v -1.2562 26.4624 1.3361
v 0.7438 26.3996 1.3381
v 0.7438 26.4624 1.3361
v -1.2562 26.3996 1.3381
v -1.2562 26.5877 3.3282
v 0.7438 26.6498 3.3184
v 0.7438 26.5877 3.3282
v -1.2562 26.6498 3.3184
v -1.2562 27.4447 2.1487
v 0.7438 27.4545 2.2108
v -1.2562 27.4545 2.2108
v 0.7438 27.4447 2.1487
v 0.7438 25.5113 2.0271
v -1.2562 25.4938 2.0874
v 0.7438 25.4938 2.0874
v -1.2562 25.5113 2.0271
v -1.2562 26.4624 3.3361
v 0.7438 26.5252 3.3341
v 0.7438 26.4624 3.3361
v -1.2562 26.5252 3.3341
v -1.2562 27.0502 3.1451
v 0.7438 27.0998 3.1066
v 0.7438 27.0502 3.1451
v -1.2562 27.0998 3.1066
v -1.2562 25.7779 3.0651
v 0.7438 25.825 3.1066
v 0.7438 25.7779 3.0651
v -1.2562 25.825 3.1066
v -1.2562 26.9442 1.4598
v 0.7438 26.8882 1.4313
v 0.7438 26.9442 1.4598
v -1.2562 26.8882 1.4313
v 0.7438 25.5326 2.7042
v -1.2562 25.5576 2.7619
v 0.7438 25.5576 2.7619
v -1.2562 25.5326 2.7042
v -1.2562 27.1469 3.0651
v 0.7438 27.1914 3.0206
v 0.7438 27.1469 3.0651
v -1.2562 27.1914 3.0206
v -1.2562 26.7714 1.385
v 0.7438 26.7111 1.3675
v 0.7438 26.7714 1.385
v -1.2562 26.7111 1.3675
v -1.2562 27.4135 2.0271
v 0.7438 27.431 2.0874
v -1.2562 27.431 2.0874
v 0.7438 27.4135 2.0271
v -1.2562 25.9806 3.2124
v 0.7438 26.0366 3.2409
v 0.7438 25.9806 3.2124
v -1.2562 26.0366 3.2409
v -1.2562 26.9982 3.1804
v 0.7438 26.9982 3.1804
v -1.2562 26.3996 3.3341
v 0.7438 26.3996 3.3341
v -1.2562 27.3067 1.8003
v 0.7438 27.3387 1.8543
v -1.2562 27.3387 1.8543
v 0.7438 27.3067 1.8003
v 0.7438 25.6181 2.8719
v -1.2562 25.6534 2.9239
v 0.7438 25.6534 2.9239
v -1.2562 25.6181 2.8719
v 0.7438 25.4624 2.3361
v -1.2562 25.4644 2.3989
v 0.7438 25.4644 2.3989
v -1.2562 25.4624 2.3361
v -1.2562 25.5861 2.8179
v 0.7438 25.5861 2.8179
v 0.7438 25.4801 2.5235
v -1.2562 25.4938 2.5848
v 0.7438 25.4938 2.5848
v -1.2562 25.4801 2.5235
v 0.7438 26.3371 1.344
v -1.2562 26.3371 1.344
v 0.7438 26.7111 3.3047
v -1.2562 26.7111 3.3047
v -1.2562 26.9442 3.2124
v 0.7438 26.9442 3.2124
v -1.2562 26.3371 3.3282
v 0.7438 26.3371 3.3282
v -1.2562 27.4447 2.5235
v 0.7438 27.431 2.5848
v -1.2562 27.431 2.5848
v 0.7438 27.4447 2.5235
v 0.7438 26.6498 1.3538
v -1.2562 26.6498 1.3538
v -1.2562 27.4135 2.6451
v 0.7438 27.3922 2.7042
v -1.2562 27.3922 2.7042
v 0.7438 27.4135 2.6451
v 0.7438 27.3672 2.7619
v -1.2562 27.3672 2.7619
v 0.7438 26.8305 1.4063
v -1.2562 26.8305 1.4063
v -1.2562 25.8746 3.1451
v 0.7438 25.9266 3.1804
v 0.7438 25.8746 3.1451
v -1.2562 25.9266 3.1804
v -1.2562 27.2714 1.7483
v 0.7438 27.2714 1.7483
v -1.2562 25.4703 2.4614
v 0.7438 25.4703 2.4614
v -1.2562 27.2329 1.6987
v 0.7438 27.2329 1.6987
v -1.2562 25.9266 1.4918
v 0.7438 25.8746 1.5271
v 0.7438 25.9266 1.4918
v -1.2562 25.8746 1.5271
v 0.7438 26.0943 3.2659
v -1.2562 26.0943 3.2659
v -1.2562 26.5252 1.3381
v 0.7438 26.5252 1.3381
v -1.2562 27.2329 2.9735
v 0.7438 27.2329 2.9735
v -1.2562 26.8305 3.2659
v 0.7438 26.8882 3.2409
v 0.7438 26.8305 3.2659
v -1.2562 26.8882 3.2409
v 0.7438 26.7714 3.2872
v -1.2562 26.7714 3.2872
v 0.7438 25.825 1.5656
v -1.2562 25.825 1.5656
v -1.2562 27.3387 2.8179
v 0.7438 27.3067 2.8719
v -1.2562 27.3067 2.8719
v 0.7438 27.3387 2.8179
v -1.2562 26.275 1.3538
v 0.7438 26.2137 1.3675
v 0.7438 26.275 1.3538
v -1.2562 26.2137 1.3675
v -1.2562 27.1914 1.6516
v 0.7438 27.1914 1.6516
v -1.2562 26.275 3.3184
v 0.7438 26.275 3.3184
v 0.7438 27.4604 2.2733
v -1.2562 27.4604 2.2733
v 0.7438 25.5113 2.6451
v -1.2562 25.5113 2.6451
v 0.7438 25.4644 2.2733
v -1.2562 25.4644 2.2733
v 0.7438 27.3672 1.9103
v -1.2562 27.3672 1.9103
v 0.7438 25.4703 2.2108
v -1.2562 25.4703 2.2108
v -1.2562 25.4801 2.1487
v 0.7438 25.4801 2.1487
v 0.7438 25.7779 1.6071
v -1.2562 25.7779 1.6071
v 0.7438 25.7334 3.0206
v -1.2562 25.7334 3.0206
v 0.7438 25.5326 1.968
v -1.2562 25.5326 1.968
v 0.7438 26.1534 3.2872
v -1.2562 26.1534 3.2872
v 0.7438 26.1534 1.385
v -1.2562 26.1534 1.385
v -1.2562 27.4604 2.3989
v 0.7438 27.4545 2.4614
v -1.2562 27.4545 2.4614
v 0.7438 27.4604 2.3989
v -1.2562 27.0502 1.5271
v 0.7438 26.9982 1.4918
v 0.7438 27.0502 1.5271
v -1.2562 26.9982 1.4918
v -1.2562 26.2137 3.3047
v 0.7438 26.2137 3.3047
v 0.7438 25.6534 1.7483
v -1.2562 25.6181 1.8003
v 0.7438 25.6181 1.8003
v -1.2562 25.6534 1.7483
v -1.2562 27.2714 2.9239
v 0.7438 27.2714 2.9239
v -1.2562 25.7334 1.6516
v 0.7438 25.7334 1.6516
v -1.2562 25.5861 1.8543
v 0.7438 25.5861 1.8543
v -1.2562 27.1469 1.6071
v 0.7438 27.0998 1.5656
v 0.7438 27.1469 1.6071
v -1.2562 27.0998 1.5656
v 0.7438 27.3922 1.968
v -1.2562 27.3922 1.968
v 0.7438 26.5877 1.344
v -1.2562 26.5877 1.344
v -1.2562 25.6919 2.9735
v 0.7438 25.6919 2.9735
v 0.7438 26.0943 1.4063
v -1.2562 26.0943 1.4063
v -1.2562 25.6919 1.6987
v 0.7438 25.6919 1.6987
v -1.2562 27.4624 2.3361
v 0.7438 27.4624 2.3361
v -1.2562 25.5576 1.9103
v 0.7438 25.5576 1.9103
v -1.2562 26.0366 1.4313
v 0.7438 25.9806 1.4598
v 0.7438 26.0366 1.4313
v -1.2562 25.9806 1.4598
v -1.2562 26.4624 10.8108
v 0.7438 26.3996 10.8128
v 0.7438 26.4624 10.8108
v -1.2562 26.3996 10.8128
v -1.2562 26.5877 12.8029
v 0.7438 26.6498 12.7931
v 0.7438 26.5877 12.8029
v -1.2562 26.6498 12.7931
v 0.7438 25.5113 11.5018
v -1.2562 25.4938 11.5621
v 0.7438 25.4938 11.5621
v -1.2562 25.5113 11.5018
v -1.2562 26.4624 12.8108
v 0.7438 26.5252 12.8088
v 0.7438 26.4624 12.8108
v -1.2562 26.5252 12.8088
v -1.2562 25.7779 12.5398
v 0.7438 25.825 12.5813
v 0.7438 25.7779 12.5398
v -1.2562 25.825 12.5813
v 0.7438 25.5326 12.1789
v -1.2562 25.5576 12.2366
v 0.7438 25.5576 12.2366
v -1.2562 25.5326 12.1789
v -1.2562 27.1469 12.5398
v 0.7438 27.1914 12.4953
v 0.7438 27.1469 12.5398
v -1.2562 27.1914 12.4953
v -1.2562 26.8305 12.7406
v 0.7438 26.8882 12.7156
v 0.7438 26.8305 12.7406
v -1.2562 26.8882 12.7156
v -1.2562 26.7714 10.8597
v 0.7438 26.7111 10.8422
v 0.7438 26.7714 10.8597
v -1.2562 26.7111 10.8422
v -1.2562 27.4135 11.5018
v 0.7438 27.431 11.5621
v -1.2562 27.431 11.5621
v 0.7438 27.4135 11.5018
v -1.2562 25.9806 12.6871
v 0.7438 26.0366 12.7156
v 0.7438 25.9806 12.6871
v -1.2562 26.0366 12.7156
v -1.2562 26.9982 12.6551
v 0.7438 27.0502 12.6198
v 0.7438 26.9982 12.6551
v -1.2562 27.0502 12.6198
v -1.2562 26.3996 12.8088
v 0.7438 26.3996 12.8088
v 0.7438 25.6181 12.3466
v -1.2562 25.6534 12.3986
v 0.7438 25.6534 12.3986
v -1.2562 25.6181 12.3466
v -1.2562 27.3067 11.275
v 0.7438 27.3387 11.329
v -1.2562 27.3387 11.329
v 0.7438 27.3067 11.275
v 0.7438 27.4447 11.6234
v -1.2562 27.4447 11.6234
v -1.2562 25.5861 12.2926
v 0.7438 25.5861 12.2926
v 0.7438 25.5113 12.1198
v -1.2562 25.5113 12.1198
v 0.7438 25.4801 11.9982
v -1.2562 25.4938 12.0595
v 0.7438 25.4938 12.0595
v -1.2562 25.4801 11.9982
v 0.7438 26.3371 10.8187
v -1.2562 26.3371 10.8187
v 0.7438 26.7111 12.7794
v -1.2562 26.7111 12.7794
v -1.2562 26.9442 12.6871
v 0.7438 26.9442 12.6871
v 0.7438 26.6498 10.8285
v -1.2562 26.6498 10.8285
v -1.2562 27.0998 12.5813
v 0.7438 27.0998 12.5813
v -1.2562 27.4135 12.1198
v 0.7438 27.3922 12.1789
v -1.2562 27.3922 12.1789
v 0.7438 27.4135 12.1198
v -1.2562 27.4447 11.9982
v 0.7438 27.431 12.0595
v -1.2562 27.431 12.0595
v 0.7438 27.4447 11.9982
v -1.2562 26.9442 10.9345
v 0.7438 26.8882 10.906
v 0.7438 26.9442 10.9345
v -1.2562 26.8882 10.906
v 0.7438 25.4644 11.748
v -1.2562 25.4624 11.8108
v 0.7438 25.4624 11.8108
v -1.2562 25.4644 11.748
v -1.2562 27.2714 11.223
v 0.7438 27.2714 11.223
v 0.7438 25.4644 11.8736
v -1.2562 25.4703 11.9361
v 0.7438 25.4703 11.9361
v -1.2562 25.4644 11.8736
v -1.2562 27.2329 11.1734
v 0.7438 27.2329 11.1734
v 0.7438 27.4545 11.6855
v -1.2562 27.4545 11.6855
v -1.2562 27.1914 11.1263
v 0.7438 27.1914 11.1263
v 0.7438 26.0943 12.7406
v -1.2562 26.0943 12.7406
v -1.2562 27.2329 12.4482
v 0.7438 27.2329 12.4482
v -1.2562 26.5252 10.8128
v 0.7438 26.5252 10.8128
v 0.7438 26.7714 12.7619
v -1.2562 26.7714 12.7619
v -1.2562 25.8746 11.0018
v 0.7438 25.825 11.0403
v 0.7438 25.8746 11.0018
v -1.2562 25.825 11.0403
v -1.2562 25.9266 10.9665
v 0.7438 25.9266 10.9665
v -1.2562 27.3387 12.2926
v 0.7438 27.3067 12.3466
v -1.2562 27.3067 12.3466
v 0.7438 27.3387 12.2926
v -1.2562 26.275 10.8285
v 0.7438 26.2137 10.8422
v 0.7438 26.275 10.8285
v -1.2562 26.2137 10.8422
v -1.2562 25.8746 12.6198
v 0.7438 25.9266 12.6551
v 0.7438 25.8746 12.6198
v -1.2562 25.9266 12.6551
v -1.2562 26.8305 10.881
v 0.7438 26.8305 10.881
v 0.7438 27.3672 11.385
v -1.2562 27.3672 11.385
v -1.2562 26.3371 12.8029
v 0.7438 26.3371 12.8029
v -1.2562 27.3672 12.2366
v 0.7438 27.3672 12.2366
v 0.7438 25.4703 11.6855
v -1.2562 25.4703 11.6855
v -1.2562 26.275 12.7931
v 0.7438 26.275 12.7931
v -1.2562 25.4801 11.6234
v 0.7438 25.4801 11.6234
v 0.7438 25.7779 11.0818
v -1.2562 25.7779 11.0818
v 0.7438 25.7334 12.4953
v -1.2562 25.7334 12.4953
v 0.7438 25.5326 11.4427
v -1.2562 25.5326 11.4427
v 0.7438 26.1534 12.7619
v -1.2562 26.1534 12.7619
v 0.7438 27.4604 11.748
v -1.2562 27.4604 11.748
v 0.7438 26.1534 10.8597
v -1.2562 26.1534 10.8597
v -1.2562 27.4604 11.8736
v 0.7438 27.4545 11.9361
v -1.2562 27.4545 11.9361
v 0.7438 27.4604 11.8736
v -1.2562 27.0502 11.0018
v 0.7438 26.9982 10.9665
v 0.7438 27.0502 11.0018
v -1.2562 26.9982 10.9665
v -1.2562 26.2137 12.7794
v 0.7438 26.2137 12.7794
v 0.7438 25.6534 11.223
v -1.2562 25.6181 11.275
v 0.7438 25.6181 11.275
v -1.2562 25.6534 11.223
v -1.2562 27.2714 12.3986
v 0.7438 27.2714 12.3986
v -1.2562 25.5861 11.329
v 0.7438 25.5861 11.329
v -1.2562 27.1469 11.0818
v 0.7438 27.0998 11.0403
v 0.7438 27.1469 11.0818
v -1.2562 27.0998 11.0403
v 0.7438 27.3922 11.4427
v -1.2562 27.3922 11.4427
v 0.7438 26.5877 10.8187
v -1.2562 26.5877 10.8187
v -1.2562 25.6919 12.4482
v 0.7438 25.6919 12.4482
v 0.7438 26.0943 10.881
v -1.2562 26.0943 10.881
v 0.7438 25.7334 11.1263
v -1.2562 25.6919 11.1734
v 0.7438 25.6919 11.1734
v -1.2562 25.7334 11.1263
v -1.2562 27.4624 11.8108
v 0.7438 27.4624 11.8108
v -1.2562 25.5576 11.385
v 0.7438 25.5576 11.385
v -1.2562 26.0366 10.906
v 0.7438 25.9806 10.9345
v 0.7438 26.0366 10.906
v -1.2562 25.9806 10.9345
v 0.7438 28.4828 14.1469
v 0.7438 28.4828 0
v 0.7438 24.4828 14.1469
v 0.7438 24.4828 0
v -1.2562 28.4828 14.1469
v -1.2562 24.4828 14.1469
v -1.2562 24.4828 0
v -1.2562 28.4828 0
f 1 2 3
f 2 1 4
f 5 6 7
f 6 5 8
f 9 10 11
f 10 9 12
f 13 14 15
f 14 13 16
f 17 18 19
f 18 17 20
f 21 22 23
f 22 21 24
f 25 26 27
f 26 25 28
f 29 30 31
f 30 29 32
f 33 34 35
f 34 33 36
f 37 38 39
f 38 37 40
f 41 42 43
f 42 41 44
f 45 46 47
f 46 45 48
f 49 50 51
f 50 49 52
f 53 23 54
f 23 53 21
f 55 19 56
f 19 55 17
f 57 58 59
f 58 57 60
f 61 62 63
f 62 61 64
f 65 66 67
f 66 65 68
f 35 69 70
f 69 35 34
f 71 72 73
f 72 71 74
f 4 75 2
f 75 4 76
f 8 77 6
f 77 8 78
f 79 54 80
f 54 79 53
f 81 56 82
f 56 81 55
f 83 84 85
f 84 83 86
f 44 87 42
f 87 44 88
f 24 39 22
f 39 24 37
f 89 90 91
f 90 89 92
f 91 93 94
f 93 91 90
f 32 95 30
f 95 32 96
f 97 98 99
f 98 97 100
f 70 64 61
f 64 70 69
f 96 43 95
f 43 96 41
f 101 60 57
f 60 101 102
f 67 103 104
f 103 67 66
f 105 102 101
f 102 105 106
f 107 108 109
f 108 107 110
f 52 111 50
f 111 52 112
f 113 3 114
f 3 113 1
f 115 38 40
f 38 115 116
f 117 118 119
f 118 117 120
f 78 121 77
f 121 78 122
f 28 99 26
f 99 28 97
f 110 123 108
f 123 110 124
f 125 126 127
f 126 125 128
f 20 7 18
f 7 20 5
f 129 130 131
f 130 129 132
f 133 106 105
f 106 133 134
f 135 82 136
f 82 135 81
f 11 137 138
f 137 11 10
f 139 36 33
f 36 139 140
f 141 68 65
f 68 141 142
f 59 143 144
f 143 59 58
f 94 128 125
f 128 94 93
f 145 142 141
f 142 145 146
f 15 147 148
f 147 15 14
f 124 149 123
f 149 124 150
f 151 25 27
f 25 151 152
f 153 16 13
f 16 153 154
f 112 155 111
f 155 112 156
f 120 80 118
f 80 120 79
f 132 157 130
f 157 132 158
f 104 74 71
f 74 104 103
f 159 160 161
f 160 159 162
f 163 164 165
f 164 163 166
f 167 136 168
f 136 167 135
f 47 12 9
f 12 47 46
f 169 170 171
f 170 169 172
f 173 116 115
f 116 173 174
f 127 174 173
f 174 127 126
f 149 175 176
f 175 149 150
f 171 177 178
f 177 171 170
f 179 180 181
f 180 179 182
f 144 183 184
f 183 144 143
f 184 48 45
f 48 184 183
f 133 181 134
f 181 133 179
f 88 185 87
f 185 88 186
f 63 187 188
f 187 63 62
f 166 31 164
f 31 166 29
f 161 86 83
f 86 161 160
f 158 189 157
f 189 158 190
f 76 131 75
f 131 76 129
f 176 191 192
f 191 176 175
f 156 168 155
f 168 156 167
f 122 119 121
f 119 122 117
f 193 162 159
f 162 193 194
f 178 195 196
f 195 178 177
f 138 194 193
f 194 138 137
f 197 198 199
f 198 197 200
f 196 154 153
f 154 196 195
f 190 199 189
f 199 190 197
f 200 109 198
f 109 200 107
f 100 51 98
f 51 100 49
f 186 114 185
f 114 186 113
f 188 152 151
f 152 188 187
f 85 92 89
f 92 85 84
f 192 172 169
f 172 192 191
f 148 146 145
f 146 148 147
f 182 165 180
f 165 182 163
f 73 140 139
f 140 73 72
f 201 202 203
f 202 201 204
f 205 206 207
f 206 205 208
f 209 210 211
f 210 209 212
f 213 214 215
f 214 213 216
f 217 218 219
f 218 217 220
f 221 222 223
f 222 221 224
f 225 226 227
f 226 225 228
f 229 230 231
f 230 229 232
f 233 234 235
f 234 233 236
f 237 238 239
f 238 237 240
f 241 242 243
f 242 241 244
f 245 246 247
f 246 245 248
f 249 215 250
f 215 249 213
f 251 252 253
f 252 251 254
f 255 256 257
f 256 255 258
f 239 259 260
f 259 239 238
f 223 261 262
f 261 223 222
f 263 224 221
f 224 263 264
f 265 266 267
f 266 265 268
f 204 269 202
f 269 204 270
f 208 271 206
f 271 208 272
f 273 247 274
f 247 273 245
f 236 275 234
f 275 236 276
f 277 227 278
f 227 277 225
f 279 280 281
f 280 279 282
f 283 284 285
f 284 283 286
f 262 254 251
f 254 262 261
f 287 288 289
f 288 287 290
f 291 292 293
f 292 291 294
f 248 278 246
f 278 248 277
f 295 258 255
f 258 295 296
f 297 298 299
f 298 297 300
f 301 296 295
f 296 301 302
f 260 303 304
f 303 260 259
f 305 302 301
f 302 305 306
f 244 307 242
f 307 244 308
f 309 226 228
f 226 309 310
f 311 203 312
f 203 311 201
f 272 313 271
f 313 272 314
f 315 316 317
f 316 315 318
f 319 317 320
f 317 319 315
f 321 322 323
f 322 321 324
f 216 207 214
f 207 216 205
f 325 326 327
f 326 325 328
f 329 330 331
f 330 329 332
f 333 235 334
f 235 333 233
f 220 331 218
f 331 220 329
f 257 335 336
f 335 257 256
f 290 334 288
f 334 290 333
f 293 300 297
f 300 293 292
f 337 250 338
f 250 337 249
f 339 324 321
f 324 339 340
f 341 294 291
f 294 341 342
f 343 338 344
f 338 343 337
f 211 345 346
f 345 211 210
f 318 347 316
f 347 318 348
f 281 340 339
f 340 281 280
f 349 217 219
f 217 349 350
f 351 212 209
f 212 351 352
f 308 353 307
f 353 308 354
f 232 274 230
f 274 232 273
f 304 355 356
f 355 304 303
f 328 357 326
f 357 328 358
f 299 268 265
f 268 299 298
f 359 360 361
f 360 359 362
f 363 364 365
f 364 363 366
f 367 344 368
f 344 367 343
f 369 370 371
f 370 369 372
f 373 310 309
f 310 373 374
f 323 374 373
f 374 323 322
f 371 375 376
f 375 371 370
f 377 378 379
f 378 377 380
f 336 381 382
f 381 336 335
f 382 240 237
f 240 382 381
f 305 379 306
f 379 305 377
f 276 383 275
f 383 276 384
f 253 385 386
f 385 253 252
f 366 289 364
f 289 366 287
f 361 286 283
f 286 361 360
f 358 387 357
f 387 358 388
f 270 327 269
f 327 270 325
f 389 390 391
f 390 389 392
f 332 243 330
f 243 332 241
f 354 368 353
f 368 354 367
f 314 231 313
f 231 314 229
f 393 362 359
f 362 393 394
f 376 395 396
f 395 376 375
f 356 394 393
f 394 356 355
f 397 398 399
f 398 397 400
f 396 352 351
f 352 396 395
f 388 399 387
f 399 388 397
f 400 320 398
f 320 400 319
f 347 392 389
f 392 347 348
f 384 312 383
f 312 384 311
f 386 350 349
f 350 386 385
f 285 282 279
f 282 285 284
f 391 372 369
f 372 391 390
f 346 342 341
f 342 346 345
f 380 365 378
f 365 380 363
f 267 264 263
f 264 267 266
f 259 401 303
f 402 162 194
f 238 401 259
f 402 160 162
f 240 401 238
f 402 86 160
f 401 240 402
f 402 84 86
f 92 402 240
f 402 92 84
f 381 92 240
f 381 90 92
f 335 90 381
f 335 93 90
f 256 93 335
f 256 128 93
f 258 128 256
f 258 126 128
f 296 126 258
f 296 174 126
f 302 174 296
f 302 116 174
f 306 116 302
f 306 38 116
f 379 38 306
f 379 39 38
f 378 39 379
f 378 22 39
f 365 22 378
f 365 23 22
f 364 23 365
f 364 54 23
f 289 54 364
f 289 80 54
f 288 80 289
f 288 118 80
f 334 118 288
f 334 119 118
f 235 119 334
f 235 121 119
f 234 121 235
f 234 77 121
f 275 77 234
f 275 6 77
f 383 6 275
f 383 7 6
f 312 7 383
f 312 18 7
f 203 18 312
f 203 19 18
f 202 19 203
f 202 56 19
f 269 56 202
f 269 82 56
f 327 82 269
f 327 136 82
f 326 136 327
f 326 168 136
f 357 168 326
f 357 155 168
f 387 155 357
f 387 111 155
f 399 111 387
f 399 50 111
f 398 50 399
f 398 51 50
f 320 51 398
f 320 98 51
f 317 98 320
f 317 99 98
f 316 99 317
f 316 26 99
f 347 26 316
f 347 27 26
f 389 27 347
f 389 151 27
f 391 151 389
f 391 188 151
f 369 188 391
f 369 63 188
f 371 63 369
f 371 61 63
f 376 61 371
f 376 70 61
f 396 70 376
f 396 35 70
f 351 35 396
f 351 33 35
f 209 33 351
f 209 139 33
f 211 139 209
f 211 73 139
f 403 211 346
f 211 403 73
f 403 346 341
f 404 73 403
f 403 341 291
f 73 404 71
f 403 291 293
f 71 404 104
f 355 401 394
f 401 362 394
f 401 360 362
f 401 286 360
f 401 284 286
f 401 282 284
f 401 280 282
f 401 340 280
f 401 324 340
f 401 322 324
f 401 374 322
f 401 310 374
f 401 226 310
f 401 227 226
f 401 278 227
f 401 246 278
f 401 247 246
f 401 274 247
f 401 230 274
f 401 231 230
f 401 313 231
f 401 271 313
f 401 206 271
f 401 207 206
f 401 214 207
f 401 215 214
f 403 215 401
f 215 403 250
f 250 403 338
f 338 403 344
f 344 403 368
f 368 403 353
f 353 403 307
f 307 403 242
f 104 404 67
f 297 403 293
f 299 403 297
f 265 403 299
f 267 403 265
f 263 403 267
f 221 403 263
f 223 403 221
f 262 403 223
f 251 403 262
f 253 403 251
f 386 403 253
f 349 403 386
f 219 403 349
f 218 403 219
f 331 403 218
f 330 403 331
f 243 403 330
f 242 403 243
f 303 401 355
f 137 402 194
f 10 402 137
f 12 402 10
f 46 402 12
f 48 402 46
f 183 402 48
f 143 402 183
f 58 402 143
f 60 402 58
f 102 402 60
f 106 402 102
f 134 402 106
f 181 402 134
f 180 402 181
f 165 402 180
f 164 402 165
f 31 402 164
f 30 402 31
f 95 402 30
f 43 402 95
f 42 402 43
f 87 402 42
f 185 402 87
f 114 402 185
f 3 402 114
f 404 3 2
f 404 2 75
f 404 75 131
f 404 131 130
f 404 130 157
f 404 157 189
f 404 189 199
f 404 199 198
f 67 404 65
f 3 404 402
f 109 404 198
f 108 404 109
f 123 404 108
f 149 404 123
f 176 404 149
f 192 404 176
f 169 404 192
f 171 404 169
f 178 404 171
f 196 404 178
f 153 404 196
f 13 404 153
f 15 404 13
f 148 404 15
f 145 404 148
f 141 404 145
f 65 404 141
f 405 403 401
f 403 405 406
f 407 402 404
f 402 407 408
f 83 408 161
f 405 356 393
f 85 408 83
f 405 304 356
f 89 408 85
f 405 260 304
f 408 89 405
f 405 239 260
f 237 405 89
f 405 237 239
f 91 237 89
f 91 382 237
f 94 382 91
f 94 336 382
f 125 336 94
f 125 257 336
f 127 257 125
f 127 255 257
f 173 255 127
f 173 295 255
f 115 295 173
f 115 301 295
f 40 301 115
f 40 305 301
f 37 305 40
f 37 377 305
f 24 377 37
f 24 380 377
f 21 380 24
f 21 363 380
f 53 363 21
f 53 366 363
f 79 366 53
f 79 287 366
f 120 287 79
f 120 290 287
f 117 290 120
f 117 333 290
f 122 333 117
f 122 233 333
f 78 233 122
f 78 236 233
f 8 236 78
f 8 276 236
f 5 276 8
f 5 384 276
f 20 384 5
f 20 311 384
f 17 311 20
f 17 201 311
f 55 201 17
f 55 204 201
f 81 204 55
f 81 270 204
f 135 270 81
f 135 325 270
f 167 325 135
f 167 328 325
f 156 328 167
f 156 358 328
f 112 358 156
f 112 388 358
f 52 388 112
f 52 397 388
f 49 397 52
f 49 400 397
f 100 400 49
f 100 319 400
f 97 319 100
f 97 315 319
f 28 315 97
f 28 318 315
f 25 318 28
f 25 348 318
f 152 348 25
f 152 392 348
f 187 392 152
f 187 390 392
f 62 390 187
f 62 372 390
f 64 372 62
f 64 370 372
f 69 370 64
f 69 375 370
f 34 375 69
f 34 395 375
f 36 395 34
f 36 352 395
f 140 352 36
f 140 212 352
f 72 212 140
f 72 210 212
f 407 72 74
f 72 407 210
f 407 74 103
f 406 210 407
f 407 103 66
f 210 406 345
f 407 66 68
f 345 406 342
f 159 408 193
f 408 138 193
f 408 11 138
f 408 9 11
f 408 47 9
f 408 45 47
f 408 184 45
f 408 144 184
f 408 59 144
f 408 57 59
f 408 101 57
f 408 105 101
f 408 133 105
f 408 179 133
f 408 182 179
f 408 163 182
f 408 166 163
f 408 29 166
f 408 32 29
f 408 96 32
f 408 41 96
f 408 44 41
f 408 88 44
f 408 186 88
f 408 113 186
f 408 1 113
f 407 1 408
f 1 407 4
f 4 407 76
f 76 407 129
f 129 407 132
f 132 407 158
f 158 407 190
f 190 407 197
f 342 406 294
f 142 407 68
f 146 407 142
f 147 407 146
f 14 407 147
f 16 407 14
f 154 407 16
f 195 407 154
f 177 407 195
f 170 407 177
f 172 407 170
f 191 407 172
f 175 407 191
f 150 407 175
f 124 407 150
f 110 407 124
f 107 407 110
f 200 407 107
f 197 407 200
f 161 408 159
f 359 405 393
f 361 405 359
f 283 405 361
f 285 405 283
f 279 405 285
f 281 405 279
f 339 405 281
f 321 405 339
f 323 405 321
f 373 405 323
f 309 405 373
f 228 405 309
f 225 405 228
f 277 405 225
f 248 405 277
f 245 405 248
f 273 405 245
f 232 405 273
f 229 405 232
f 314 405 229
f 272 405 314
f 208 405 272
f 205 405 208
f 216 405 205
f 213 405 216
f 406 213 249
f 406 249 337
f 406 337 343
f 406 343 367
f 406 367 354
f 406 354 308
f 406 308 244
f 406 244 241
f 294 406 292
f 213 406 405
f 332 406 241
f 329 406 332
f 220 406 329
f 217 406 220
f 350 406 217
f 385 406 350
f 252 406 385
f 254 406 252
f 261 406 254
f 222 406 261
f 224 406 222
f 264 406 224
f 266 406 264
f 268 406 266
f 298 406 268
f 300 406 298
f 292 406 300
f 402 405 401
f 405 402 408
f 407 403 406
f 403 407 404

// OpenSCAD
/*
    spring.scad is the code to generate a spring for the ultrasonic
    screwdriver
    
    Copyright (C) 2023  C.Y. Tan
    Contact: cytan299@yahoo.com

    This file is part of the CP4 and CP5 dust cover distribution.

    spring.scad is free software: you can redistribute it and/or modify
    it under the terms of the GNU General Public License as published by
    the Free Software Foundation, either version 3 of the License, or
    (at your option) any later version.

    spring.scad is distributed in the hope that it will be useful,
    but WITHOUT ANY WARRANTY; without even the implied warranty of
    MERCHANTABILITY or FITNESS FOR A PARTICULAR PURPOSE.  See the
    GNU General Public License for more details.

    You should have received a copy of the GNU General Public License
    along with spring.scad.  If not, see <http://www.gnu.org/licenses/>.

*/

$fn=100;


/***************************************
  Spring definitions
****************************************/

spring_outer_r = 2.2562; //mm
spring_inner_r = 1.2562; // mm
spring_len_x = 14.1469; //mm
spring_insertion_len= 31.3297 - spring_outer_r; //mm, less the outer radius of the spring
spring_top_len = 11.9735; //mm

spring_stopper_len_x = 10.05; //mm


spring_thickness = 1; //mm

// croosbar
crossbar_thickness = 2; //mm
crossbar_len_y = 4; //mm


//screw holes
screw_r = 0.5; //mm



pushbutton_stem_r = 2.5; //mm, radius of the push button stem

module make_curved_part()
{
  difference(){
    cylinder(r = spring_outer_r, h = spring_len_x, center = false);
    // make the hole
    union(){
      cylinder(r = spring_inner_r, h = 4*spring_len_x, center = true);
      // then remove half the cylindrical part
      translate([0, spring_outer_r, 0]){
	cube([4*spring_outer_r, 2*spring_outer_r, 4*spring_len_x], center=true);
      }
    }
  }
}

module make_insertion_part()
{
  dr = 0.1;//mm, tolerance


  // make the insertion part
  difference(){
    union(){
      translate([-spring_thickness-spring_inner_r, 0,0]){;
	cube([spring_thickness, spring_insertion_len, spring_len_x], center=false);;
      };
    }

    // make the slot
    union(){
      hole_y_pos = 7.0735; // mm, the hole y position measured from the end of the curved part.
      
      // make the hole first
      translate([-2*spring_thickness,hole_y_pos, spring_len_x/2]){
	rotate([0,-90, 0]){
	  cylinder(r=pushbutton_stem_r + dr, h=4*spring_thickness, center=true);
	}
      }
      // then the slot below the hole
      
      translate([-3*spring_thickness, hole_y_pos, hole_y_pos - pushbutton_stem_r - dr]){
	cube([4*spring_thickness, spring_insertion_len*2, 2*(pushbutton_stem_r + dr)]);
      }            
    }
  }
}

// this is the top part of the spring that hosts the stopper
module make_top_part()
{
  translate([spring_inner_r, 0, 0]){
    cube([spring_thickness, spring_top_len, spring_len_x], center=false);
  }
}

module make_stopper()
{
  // The stopper is linearly extruded from this shape

  hole_y_pos = 7.0735; // mm, the hole y position measured from the end of the curved part.
  difference(){
    translate([spring_outer_r,hole_y_pos, (spring_len_x - spring_stopper_len_x)/2.0]){
      linear_extrude(height = spring_stopper_len_x,center=false){
	polygon(points=[[0,0],[0,-6.7297],[3.7149,-19.2297],[4.0622,-21.1993],[6.0622,-21.1933],[5.7149,-19.2297]]);
      }
    }


    translate([10,-14.1259, spring_len_x/2]){
      rotate([0,-90,0]){
	cylinder(r=2.5, h=20, center=false);
      }
    }
  }
}


module make_stopper2()
{
    hole_y_pos = 7.0735; // mm, the hole y position measured from the end of the curved part.
  difference(){
    translate([spring_outer_r,hole_y_pos, (spring_len_x - spring_stopper_len_x)/2.0]){
      linear_extrude(height = spring_stopper_len_x,center=false){
	/*
	  // long
	polygon(points=[[0,0],[-0.9208,5.2219],[-2.3024,4.9783],
			[-1,-2.4078], [-1,-7.0735], [0,-7.0735],[0,0.3437],
			[0,-6.7297],[3.7149,-19.2297],[4.4148,-23.1993],
			[6.9148,-21.1993],[6.2149,-19.2297],[5.7149,-19.2297]]);
	*/

	/* //4 mm foot
	polygon(points=[[0,0],[-0.9208,5.2219],[-2.3024,4.9783],
			[-1,-2.4078], [-1,-7.0735], [0,-7.0735],[0,0.3437],
			[0,-6.7297],[3.7149,-19.2297],[6.2149,-19.2297],
			[5.5149,-15.2601],[4.5351,-15.2601]]);
	*/

	/* //8 mm foot
	polygon(points=[[0,0],[-0.9208,5.2219],[-2.3024,4.9783],
			[-1,-2.4078], [-1,-7.0735], [0,-7.0735],[0,0.3437],
			[0,-6.7297],
			[4.8946,-23.1993],
			[6.9148,-23.1993],
			[5.5149,-15.2601],[4.5351,-15.2601]]);
	*/
	// 8 mm foot with a lip
	/*
	polygon(points=[[0,0],[-0.9208,5.2219],[-2.3024,4.9783],
			[-1,-2.4078], [-1,-7.0735], [0,-7.0735],[0,0.3437],
			[0,-6.7297],
			[4.8946,-23.1993],
			[6.9148,-23.1993],
			[6.0062,-18.0465],
			[6.9859,-17.8457],
			[6.7579,-16.5529],
			[4.5351,-15.2601],
			[5.5149,-15.2601],[4.5351,-15.2601]]);
	*/

	// 9 mm foot with lip
	polygon(points=[[0,0],[-0.7717,5.2150],[-2.1595,5.0097],
			[-1.0661,-2.3792],
			[-1.1809,-6.7297],
			[-0.1904,-7.0735],			
			[-0.1013,-7.0431],
			[4.2522,-23.3256],
			[6.2761,-23.4117],
			[5.2464,-17.2357],
			[6.2357,-17.0924],
			[6.0390,-15.7635],
			[3.8573,-14.4401]
			]);
	
	
      }
    }
    
    //    translate([10,-14.1259, spring_len_x/2]){
    translate([10,-10.1259, spring_len_x/2]){    
      rotate([0,-90,0]){
	union(){
	  cylinder(r=2.5, h=20, center=false);
	  /* //for 4 mm foot
	  translate([0,-2.5,0]){
	    cube([5,5,40], center=true);
	  */

	  translate([0,-5,0]){
	    cube([5,10,40], center=true);	  
	  }
	}
      }
    }
  }
}

module make_screw_holes()
{

  // position of hole 1
  hole_x_pos1 = 2.3361; //mm
  hole_y_pos1 = 26.4624;

  // position of hole 2
  hole_x_pos2 = hole_x_pos1 + 9.4747; //mm
  hole_y_pos2 = 26.4624;

  // holes for the slot
  translate([-3*spring_thickness,hole_y_pos1, hole_x_pos1]){
    rotate([0,-90,0]){
      cylinder(r=screw_r, h=4*spring_thickness, center=true);
    }
  }

  translate([-3*spring_thickness,hole_y_pos2, hole_x_pos2]){
    rotate([0,-90,0]){
      cylinder(r=screw_r, h=4*spring_thickness, center=true);
    }
  }

  // holes for the crossbar
  translate([spring_thickness - 0.275,hole_y_pos1, hole_x_pos1]){
    rotate([0,-90,0]){
      cylinder(r=2*screw_r, h=4*spring_thickness, center=true);
    }
  }

  translate([spring_thickness -.275,hole_y_pos2, hole_x_pos2]){
    rotate([0,-90,0]){
      cylinder(r=2*screw_r, h=4*spring_thickness, center=true);
    }
  }    
}

module make_crossbar()
{
  crossbar_y_pos = 24.4828;

  
  translate([-spring_inner_r,crossbar_y_pos,0]){
    cube([crossbar_thickness, crossbar_len_y, spring_len_x], center=false);
  }
}

difference(){
  union(){
    /*
    make_curved_part();
    make_insertion_part();

    // this is version 1
    //    make_top_part();
    //    make_stopper();

    // this is version 2
    make_stopper2();
    */
        make_crossbar();

  }

  union(){
    make_screw_holes();            
  }
}
